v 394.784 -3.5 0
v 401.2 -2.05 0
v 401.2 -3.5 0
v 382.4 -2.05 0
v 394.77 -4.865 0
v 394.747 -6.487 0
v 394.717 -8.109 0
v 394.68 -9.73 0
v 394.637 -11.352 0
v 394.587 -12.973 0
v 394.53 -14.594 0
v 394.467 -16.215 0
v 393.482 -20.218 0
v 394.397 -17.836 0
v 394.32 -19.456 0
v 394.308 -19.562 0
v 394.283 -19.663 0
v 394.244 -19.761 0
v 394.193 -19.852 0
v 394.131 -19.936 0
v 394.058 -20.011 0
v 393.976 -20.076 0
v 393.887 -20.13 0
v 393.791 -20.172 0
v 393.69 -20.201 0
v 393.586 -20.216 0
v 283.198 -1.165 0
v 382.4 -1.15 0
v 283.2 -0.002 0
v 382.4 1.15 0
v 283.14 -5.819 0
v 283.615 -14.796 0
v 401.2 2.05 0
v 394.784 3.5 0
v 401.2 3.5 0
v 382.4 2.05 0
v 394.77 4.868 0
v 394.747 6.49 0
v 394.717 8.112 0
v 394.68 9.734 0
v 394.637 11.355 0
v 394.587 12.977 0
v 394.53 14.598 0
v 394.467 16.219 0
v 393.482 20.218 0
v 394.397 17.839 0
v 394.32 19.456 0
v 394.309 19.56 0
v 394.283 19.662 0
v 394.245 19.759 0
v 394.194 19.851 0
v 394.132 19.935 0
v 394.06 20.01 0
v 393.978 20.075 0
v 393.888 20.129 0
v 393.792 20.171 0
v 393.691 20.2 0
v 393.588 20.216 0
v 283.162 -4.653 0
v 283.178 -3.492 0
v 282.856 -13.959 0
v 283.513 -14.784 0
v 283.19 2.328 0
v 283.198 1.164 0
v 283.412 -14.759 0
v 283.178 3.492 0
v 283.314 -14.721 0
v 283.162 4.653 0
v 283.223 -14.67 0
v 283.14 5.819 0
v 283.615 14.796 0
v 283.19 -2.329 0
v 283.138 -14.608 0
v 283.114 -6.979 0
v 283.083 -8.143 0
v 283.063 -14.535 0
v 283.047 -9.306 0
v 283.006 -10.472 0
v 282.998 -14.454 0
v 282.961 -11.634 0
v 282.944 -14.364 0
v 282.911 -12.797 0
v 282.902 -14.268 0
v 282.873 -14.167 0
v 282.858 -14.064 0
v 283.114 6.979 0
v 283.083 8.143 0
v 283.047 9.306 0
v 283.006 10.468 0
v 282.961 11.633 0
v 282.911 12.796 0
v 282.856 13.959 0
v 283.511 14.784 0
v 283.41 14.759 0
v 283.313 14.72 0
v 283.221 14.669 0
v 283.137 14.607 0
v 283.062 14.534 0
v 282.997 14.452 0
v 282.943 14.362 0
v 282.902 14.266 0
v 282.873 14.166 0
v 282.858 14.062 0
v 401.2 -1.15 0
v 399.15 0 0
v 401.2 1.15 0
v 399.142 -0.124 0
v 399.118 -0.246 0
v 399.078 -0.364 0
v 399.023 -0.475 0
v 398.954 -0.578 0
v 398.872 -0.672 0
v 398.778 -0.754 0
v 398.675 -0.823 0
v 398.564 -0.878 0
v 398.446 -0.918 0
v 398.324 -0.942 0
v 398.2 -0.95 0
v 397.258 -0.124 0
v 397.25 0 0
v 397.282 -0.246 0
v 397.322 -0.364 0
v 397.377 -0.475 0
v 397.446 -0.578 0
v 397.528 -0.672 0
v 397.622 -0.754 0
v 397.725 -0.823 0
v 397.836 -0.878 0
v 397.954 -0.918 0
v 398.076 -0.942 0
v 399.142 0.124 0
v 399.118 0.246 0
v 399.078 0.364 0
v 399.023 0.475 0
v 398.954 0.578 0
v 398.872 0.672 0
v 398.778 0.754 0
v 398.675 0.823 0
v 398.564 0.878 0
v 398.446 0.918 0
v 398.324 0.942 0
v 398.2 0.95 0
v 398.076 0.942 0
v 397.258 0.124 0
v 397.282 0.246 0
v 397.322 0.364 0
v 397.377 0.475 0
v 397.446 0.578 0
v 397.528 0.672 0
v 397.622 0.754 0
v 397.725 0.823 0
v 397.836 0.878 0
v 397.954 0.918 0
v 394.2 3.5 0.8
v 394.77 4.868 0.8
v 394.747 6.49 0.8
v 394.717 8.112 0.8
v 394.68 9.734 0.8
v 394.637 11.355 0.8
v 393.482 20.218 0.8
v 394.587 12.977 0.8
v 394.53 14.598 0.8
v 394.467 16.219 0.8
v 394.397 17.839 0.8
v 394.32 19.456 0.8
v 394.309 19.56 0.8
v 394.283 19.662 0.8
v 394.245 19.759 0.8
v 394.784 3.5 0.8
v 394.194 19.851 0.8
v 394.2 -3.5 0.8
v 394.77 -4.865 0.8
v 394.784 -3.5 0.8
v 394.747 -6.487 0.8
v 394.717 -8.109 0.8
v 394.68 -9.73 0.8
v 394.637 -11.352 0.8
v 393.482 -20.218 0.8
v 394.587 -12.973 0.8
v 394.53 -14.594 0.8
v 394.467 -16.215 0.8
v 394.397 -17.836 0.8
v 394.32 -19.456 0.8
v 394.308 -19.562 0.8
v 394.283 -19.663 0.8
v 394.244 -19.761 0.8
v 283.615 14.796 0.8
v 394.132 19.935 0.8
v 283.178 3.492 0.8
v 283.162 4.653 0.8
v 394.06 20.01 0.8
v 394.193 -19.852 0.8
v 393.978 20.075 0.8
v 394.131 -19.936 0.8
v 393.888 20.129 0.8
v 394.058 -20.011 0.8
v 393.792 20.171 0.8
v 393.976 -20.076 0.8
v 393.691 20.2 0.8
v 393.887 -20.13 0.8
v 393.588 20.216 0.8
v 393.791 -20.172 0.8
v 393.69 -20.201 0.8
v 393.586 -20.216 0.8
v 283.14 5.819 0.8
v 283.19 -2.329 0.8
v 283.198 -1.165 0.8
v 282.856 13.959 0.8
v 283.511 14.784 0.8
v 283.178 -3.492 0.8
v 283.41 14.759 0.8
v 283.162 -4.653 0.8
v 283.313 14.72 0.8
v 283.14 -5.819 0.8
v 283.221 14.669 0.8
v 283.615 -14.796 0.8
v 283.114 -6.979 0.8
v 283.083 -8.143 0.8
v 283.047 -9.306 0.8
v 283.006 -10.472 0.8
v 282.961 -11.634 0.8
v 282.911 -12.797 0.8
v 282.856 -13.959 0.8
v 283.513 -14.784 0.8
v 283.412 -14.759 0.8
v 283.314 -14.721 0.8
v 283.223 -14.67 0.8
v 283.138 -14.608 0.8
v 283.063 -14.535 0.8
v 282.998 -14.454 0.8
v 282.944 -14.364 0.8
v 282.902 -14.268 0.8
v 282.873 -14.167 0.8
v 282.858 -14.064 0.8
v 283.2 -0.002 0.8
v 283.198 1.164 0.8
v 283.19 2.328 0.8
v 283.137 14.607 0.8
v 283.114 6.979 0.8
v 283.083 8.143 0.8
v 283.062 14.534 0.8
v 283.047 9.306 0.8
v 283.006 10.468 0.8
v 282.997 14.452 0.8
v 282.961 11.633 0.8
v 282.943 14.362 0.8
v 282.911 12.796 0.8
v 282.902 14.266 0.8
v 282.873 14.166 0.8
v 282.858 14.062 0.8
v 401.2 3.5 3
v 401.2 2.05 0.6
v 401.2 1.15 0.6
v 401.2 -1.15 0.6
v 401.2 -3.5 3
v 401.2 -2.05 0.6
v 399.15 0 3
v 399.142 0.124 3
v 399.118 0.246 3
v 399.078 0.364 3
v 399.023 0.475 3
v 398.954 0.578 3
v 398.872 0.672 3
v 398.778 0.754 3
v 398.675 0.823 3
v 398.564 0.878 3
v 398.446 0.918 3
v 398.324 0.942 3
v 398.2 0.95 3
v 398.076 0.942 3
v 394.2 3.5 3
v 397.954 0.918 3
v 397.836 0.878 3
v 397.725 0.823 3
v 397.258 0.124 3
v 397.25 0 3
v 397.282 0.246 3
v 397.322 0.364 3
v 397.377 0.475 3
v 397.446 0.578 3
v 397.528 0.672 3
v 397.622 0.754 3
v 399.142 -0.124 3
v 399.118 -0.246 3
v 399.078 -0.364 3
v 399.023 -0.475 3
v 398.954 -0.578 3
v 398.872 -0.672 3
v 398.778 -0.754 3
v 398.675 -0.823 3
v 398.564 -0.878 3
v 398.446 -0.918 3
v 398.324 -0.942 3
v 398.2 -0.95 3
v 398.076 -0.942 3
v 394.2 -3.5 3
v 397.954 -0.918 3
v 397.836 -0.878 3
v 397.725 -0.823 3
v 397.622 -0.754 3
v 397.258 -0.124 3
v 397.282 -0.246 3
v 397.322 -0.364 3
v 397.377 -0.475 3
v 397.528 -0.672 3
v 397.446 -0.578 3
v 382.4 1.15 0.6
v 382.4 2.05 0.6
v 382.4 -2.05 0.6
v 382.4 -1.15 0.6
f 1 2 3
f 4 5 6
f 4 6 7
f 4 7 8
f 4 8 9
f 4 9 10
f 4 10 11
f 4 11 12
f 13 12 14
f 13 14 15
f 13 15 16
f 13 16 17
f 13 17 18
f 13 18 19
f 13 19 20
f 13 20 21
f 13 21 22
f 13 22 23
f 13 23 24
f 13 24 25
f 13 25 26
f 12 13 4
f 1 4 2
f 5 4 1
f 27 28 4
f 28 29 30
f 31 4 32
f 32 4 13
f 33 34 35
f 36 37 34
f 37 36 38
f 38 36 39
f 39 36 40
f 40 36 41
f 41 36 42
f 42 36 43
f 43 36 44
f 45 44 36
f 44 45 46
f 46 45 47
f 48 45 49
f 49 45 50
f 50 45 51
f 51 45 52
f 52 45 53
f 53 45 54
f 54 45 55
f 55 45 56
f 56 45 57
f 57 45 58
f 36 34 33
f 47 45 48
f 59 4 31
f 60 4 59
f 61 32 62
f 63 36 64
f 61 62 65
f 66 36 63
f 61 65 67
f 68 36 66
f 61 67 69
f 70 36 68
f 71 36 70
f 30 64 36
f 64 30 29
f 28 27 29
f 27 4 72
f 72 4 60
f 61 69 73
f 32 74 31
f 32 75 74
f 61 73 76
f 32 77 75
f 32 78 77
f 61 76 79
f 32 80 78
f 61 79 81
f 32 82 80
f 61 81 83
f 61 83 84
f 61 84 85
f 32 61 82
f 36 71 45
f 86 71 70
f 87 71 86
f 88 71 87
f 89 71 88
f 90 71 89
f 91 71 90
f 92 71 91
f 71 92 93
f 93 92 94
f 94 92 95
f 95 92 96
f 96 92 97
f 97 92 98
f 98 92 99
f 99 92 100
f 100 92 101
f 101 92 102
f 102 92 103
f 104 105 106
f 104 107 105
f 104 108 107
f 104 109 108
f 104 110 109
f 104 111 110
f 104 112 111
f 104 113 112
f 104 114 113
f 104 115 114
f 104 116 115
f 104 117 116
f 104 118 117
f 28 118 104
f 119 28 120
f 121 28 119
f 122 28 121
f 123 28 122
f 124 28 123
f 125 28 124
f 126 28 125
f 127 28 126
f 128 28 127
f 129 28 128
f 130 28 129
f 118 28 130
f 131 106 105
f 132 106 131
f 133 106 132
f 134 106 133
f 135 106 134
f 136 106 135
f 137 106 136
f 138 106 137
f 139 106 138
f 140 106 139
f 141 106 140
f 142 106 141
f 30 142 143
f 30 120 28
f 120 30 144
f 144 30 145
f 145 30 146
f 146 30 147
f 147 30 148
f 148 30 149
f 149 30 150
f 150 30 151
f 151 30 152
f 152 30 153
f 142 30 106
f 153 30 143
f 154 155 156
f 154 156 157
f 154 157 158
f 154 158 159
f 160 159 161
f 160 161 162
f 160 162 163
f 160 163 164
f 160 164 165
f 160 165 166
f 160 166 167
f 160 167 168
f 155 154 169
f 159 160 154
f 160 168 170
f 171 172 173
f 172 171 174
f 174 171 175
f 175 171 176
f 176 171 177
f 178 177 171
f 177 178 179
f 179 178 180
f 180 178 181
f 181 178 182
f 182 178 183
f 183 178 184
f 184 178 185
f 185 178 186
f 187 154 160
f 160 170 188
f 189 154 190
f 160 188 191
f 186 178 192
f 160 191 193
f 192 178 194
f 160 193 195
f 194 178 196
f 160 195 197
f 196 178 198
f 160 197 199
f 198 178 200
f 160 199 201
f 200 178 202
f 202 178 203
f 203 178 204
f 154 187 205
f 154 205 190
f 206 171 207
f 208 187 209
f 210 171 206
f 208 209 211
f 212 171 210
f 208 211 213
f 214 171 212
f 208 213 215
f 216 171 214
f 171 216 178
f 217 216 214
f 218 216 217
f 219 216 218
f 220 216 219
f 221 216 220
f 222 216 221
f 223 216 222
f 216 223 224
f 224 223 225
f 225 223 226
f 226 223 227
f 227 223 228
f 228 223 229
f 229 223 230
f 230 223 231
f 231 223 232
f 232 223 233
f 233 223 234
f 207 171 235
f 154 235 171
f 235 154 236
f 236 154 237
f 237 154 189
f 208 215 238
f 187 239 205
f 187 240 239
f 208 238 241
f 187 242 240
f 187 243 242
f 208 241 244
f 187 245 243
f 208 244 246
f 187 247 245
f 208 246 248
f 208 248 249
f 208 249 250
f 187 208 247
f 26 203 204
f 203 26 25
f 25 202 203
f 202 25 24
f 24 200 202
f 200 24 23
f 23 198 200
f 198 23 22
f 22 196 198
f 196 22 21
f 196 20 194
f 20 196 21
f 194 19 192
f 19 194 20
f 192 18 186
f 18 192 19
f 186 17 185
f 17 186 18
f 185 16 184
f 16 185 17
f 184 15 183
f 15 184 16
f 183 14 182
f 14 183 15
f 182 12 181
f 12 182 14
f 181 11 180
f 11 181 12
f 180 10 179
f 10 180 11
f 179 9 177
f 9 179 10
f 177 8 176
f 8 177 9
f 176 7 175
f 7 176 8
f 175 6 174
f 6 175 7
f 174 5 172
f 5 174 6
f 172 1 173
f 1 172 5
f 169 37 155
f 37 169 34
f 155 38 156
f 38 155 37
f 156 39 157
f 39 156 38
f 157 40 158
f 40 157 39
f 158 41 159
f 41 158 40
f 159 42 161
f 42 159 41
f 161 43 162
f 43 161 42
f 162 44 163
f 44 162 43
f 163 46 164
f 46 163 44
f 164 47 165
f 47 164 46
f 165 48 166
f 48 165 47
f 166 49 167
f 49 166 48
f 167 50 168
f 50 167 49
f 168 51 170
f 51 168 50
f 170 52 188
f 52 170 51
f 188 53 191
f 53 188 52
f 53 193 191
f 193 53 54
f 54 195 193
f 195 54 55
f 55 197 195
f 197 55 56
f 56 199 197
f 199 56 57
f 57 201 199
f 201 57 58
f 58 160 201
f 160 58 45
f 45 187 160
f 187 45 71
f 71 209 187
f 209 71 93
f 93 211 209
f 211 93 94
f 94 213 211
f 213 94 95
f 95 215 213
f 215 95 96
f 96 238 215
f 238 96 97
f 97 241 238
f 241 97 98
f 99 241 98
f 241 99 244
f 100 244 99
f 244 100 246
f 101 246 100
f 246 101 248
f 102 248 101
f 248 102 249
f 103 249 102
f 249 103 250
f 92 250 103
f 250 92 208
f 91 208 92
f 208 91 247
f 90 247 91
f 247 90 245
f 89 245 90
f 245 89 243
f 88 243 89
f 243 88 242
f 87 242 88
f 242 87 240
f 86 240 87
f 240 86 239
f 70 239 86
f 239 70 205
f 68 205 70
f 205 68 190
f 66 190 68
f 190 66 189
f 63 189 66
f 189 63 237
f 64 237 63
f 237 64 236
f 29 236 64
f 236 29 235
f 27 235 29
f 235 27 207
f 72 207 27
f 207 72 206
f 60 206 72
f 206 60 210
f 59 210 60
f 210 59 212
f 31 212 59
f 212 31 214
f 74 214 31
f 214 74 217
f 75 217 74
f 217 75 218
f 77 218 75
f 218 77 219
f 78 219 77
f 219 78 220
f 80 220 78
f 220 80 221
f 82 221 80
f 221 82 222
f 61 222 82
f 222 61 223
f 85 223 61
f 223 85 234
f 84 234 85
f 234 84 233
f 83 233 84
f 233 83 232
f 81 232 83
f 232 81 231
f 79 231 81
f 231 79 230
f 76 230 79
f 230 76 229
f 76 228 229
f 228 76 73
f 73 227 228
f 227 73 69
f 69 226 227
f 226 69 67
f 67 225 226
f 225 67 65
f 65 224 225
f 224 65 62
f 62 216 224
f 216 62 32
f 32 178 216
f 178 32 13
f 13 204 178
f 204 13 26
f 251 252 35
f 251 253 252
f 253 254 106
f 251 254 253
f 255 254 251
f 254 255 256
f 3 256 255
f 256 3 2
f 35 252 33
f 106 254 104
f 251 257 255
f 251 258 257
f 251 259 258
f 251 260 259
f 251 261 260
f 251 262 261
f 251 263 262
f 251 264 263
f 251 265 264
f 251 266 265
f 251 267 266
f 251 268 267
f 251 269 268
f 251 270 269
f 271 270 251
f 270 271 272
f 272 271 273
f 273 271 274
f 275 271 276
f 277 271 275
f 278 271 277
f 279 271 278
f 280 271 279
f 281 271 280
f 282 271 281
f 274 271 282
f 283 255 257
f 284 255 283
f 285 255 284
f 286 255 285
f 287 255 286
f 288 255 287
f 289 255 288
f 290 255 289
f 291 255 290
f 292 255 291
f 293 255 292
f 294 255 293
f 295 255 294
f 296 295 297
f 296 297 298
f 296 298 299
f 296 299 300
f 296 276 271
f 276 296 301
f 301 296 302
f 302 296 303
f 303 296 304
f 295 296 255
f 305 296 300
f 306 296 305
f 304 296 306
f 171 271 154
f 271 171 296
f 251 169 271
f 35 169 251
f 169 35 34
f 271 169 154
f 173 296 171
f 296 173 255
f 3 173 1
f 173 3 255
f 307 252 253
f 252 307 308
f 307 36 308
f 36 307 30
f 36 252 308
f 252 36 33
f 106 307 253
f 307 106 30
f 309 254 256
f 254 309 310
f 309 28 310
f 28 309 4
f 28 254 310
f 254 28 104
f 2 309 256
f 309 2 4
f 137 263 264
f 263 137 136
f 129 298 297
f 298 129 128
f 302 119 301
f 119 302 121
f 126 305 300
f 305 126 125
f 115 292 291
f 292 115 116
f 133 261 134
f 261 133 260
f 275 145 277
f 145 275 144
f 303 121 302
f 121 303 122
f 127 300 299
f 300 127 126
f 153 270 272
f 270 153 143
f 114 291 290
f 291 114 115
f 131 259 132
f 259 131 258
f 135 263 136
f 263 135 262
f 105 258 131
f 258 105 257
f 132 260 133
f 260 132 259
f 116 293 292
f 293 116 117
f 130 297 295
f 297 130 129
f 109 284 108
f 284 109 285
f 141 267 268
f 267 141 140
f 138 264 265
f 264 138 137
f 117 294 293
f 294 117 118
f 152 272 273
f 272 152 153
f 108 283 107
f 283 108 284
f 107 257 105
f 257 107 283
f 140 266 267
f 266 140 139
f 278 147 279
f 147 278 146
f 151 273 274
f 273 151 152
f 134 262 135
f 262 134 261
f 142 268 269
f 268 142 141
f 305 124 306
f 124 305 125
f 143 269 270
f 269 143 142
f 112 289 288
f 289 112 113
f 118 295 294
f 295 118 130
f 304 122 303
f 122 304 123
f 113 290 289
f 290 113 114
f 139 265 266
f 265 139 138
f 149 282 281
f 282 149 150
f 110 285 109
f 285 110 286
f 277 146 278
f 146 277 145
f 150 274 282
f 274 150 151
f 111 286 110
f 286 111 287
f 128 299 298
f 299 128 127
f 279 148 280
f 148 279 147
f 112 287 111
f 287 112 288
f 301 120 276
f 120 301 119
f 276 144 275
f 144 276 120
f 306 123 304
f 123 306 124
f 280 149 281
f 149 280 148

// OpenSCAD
// Gen-EB — bobbin LID (top flange + locating tab). Print x12, flange face DOWN on the bed.
// CA-glue onto the hub top BEFORE winding. Tab = lap joint into the stator tab pocket; 1.75 mm filament
// pin through pin hole + stator ledge, trim flush. Lead slots carry both leads flush.
include <parameters.scad>;
$fn = 48;
module sector_2d(r_in, r_out, ang) {
    polygon([
        for (a = [-ang/2 : ang/24 : ang/2]) [r_in*cos(a), r_in*sin(a)],
        for (a = [ang/2 : -ang/24 : -ang/2]) [r_out*cos(a), r_out*sin(a)]
    ]);
}
module footprint_2d() { offset(r=wall) sector_2d(coil_id_r, coil_od_r, span_deg); }
module hub_2d()       { offset(delta=-coil_core_inset) sector_2d(coil_id_r, coil_od_r, span_deg); }

difference() {
    union() {
        linear_extrude(flange_t) footprint_2d();
        translate([coil_od_r + 0.2, -tab_w/2, 0]) cube([tab_len, tab_w, tab_h]);
    }
    translate([coil_mount_r, 0, -0.1]) cylinder(d=pin_d, h=tab_h + 1);
    for (y = [lead_y, -lead_y])
        translate([coil_od_r - coil_core_inset - 0.5, y - lead_slot_w/2, -0.1])
            cube([coil_core_inset + tab_len + 2, lead_slot_w, lead_groove_d + 0.1]);
}
